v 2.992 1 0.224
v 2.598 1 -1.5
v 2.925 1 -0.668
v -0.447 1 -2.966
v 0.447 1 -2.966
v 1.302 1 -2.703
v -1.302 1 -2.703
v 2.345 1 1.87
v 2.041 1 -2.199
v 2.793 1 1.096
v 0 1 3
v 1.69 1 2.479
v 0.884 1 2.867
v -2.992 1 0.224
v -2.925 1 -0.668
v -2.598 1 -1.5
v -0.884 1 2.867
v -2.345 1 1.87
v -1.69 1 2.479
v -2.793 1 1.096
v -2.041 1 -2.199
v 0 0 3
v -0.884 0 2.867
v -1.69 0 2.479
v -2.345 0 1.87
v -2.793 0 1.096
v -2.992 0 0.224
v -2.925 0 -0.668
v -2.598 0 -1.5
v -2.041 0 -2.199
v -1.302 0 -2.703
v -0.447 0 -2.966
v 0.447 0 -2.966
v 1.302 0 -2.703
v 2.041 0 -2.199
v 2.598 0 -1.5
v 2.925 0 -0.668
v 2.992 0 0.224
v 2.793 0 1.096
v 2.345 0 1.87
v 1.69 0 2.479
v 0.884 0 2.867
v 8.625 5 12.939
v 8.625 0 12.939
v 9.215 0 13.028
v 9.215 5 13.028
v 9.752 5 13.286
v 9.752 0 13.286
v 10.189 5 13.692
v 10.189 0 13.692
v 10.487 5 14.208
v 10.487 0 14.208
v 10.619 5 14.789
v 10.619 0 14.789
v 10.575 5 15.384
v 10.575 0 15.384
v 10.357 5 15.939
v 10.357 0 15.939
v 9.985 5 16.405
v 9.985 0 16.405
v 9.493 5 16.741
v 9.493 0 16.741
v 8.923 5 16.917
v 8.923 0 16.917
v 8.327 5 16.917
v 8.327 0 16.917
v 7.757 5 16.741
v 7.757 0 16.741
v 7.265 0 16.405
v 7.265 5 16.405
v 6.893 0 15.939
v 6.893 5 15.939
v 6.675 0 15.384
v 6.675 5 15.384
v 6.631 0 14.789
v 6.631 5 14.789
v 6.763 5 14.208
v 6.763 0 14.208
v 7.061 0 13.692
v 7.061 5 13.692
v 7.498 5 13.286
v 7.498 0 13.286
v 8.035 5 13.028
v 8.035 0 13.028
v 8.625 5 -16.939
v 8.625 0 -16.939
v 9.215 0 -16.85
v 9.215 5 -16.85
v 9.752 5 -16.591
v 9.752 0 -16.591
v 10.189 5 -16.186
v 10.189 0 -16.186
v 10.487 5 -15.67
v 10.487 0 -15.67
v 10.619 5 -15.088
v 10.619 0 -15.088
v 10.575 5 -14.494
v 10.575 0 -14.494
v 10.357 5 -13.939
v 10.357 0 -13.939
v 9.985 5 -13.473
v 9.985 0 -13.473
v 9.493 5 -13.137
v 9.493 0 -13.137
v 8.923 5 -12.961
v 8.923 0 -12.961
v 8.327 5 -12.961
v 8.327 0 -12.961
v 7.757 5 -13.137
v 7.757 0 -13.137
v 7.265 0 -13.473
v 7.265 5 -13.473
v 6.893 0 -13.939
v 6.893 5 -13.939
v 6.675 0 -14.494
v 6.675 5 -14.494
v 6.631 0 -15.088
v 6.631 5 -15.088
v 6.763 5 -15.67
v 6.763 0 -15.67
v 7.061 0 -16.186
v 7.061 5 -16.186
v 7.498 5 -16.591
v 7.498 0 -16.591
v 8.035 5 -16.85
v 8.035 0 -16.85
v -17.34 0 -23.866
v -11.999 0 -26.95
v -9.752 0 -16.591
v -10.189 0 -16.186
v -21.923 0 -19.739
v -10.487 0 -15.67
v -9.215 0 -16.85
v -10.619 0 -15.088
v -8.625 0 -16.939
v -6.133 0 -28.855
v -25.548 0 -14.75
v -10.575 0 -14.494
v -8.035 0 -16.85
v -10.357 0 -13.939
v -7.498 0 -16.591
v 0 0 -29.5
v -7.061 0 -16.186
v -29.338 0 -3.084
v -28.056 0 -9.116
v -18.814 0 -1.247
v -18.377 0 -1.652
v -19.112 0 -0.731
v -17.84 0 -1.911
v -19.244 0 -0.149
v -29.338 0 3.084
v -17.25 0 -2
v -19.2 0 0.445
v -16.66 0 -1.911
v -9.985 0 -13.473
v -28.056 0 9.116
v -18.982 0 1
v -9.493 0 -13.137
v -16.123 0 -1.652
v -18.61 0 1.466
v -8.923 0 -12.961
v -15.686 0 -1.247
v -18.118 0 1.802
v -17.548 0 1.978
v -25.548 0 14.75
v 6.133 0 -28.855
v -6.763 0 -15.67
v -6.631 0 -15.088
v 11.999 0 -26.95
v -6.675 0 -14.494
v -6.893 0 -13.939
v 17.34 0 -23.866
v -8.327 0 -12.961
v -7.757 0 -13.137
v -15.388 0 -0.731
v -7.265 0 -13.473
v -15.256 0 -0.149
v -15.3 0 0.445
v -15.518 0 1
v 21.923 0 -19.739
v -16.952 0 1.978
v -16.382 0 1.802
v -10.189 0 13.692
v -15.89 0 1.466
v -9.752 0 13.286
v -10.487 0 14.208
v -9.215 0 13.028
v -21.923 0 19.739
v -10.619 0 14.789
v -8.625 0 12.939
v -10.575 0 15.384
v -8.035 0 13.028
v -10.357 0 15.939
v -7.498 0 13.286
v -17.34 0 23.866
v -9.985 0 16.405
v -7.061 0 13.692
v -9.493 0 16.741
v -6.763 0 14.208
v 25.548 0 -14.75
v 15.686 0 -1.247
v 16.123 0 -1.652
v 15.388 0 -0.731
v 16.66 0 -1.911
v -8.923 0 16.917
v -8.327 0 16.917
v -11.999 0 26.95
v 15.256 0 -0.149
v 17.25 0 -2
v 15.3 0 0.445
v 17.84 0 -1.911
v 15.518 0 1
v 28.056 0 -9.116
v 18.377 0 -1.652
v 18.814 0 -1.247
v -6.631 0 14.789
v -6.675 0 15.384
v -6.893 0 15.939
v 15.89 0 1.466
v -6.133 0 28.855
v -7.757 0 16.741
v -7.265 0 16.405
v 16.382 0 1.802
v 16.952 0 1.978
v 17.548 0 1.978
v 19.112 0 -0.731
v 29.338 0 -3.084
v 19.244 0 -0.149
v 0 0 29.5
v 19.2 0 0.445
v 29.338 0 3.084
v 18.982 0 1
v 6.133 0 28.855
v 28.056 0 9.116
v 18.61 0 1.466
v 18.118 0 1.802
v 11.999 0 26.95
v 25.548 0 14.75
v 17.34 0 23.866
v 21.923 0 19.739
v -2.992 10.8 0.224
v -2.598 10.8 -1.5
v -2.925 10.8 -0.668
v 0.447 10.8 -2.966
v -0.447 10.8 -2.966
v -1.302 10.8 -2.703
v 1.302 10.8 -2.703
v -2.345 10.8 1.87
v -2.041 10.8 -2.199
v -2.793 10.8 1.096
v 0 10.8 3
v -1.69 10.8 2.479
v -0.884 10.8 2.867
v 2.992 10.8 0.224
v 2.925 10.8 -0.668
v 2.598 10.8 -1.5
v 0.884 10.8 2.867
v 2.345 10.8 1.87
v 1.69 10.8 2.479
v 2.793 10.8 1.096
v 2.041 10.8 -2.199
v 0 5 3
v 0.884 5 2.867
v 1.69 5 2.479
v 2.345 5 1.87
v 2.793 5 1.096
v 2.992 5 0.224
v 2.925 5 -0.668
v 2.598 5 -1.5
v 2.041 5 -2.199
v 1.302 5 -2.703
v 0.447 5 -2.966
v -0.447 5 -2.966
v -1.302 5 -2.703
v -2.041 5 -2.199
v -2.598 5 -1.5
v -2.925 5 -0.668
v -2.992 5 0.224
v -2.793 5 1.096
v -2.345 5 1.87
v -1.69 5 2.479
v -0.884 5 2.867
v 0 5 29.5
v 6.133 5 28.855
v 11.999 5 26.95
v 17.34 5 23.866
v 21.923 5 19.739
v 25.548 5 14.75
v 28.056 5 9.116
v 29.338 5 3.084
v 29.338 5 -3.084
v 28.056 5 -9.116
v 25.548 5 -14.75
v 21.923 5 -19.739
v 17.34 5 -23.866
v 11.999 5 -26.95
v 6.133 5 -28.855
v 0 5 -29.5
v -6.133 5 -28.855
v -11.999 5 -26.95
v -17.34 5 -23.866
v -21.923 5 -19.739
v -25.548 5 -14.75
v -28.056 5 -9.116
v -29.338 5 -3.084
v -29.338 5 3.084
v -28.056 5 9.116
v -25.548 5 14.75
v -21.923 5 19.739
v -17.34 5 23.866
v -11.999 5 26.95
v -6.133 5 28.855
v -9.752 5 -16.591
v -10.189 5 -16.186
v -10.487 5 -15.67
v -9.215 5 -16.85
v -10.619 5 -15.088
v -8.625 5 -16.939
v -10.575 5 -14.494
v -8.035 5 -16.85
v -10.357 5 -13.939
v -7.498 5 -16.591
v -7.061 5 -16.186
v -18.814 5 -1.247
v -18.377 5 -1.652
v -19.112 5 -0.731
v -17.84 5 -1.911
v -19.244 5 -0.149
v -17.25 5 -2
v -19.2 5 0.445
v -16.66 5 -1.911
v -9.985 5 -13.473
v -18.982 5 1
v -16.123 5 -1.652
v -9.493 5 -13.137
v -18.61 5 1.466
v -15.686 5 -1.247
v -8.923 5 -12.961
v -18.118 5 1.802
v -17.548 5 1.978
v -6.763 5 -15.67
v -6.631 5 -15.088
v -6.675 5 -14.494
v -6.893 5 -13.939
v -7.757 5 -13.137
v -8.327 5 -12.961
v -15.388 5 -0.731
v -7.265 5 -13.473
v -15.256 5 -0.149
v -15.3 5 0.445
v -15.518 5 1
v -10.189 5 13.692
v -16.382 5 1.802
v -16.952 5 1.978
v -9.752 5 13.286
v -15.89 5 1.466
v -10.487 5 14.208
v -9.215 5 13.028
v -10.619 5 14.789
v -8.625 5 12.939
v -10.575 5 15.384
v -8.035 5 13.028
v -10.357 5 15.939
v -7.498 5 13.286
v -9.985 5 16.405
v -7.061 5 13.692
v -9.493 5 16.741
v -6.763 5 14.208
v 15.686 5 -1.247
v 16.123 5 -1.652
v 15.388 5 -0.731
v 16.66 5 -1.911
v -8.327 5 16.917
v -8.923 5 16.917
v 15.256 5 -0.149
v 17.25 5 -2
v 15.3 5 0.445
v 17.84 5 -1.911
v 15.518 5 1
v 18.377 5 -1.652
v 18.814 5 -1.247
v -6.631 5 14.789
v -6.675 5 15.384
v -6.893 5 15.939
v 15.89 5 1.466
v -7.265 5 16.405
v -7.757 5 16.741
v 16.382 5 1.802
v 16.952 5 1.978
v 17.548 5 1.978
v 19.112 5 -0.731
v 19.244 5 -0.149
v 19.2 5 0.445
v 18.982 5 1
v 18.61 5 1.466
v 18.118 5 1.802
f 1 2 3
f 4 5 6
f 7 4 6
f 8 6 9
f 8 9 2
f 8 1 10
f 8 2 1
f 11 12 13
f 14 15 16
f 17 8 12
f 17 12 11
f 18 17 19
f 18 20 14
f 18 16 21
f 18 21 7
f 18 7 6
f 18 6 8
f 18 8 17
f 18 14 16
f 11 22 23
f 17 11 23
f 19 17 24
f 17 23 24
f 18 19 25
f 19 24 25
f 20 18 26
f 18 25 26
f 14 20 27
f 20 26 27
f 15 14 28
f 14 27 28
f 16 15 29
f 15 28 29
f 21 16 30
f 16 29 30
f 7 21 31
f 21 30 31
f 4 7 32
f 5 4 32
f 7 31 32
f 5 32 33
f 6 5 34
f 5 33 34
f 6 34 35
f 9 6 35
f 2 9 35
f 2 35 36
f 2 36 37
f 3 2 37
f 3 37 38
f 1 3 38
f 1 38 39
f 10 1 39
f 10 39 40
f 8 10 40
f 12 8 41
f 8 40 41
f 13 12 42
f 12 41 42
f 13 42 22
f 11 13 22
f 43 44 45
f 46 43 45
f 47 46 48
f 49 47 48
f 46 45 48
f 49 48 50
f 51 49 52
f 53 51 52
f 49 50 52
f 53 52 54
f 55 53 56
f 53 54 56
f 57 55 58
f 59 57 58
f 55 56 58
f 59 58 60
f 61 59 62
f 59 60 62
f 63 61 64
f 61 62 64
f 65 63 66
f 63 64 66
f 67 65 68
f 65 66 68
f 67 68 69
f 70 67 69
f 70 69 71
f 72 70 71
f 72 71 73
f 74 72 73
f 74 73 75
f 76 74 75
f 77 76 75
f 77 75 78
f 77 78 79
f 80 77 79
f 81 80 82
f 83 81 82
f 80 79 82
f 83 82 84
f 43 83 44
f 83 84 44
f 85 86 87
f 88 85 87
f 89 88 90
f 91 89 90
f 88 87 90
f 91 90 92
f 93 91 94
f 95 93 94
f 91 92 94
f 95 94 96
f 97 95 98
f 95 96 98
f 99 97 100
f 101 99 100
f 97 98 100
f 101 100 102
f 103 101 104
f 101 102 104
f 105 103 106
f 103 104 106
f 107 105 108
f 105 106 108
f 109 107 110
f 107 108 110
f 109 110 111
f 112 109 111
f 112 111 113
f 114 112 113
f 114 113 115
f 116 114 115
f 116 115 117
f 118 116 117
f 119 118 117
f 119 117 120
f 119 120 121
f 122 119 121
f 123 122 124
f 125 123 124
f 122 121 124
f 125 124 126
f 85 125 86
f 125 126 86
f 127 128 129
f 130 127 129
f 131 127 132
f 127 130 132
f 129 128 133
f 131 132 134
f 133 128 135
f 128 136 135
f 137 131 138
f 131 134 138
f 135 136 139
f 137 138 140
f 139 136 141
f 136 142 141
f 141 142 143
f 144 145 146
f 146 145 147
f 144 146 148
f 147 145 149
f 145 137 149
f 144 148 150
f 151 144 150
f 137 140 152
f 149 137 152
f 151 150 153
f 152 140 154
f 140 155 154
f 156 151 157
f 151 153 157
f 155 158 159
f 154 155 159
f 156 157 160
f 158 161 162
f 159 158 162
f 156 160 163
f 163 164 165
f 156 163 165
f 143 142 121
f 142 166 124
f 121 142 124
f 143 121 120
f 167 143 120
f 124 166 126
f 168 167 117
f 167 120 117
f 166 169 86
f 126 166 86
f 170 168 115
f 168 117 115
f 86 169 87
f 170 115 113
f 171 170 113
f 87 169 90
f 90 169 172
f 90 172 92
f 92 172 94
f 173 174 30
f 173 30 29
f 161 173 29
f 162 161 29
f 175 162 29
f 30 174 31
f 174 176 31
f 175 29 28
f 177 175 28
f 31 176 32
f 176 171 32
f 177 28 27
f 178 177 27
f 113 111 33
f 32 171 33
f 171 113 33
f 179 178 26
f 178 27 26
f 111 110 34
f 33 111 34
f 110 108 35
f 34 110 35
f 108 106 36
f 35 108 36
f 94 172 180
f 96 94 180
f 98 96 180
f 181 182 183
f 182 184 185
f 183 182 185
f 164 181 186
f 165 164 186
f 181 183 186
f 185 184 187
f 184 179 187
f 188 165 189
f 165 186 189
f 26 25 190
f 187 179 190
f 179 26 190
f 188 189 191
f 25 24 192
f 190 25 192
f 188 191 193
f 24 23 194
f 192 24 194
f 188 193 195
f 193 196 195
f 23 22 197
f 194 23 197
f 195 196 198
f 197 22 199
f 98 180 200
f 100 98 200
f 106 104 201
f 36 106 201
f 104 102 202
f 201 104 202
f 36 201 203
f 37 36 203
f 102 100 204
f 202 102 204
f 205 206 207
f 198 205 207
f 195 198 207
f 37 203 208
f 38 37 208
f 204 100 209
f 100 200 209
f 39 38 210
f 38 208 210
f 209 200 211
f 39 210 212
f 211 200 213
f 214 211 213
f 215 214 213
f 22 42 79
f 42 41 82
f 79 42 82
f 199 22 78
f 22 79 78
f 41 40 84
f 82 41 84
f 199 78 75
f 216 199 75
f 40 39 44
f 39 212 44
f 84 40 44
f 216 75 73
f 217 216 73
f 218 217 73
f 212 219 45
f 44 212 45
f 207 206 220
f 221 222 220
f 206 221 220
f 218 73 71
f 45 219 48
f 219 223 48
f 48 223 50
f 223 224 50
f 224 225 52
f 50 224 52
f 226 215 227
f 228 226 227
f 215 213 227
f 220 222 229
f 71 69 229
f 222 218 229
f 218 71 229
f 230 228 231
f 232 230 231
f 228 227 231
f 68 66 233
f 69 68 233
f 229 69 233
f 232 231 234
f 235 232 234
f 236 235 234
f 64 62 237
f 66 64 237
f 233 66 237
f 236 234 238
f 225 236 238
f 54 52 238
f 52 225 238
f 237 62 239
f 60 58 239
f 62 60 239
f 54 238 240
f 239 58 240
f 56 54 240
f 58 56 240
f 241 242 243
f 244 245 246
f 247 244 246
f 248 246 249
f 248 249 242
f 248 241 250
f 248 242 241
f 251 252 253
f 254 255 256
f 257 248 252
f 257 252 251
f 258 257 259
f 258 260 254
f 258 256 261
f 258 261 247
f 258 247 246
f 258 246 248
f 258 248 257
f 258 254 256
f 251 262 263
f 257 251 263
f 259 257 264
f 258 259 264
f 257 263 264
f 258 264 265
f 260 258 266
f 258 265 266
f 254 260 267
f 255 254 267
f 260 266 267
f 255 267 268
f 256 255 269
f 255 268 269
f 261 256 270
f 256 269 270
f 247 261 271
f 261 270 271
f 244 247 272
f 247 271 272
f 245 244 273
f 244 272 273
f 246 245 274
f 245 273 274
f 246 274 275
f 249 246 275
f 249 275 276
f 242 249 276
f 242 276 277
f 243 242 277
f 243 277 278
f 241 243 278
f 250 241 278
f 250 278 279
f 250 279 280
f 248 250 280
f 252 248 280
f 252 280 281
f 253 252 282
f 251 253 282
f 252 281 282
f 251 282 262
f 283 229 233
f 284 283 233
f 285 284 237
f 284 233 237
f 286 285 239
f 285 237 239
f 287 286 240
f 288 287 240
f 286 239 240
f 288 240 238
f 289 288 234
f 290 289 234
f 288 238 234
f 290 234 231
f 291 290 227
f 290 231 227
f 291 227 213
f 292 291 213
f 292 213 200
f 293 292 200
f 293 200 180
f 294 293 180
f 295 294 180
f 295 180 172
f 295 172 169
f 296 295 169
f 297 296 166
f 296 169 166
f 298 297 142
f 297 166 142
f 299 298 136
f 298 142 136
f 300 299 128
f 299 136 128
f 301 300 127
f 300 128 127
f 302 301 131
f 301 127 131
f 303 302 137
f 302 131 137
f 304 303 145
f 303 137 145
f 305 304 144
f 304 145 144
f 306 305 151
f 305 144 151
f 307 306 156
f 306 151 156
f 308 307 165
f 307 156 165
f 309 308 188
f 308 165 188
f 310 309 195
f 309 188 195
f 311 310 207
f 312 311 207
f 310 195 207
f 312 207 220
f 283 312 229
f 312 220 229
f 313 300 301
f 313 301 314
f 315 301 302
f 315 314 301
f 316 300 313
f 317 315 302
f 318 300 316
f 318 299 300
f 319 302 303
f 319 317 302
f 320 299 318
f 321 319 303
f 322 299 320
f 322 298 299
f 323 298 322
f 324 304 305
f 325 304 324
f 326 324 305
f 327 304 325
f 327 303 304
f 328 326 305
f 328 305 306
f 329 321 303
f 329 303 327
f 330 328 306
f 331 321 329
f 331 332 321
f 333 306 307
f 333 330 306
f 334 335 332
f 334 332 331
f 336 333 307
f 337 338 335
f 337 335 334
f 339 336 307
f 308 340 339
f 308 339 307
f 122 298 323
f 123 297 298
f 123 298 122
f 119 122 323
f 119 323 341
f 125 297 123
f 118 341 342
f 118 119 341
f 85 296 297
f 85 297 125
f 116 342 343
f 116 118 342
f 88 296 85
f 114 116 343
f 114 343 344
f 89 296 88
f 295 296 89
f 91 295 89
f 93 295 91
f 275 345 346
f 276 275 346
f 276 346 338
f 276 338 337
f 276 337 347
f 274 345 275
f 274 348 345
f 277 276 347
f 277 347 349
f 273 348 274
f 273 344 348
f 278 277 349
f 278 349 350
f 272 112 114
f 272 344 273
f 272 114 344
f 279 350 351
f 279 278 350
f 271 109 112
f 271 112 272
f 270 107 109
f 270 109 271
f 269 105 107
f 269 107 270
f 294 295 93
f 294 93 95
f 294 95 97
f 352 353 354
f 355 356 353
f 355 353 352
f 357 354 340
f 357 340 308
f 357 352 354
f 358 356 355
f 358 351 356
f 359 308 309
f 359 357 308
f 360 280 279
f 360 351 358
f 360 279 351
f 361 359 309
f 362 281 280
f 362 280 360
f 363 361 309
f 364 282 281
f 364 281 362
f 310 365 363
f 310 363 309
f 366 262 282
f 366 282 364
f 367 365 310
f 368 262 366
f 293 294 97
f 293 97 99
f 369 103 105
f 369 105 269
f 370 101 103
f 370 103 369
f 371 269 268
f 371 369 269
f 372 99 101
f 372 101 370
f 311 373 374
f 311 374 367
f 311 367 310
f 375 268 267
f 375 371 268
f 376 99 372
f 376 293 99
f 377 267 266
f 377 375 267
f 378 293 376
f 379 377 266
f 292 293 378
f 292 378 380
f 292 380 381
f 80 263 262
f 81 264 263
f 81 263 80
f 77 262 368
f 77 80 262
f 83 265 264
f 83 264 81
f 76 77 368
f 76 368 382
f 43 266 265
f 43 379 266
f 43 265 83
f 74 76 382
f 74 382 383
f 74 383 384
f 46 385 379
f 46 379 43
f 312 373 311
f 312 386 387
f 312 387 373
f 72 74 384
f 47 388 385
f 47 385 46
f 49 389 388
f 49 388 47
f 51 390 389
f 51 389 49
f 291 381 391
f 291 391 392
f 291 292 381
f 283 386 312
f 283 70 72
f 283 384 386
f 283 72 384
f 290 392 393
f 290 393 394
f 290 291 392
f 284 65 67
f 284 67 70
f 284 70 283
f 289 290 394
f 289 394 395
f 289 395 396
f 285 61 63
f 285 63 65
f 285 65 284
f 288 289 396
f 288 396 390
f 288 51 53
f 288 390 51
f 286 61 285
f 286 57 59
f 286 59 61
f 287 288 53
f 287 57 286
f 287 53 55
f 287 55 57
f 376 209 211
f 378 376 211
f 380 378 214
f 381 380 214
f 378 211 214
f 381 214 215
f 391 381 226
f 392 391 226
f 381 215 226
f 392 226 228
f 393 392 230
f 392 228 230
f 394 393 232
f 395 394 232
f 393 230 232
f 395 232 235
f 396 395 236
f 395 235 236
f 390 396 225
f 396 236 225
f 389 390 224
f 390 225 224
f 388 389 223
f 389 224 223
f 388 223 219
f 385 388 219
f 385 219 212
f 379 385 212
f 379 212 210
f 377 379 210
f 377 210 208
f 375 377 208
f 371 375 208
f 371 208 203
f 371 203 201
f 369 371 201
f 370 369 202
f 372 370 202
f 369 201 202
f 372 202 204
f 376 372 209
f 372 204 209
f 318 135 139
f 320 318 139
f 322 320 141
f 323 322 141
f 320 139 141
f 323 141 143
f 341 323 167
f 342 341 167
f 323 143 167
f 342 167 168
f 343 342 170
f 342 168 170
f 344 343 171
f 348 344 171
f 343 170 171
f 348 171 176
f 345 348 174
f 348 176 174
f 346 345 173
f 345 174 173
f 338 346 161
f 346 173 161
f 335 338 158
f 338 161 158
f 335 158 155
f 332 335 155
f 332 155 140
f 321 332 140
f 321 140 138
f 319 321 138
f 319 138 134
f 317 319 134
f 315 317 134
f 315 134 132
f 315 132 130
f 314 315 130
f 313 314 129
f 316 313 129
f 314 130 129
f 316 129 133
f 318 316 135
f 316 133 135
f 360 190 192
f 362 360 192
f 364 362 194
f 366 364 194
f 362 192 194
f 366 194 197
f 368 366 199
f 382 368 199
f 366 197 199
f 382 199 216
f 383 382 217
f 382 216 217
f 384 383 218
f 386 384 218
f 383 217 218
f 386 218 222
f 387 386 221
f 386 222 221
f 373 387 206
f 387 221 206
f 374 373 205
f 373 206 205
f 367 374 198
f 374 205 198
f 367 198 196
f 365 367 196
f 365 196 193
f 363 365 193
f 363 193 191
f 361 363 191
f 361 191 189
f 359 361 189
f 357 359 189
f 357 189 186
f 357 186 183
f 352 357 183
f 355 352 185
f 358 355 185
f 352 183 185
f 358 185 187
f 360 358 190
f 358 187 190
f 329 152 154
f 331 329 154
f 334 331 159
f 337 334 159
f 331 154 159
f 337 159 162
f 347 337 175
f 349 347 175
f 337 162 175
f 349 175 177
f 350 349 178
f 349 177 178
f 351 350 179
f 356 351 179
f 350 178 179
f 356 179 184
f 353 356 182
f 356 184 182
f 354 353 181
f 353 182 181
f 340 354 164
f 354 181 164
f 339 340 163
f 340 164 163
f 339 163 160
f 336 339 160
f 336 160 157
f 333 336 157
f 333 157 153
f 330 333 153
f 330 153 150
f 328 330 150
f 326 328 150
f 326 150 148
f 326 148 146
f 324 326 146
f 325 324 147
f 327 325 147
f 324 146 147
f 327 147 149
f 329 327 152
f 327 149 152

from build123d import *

# Parameters (mm, degrees)
SKETCH_1_R          = 29.5
EXTRUDE_1_DEPTH     = 5
SKETCH_2_R          = 3
EXTRUDE_2_DEPTH     = 5.8
SKETCH_3_R          = 2
CUT_EXTRUDE_1_DEPTH = 5
SKETCH_4_R          = 3
CUT_EXTRUDE_2_DEPTH = 1


with BuildPart() as part:
    # 草图1 → 凸台-拉伸1 (new body)
    with BuildSketch(Plane(origin=(0, 0, 0), x_dir=(1, 0, 0), z_dir=(0, 1, 0))):
        with Locations(Location((0, 0, 0), (0, 0, 270))):
            Circle(SKETCH_1_R)
    extrude(amount=EXTRUDE_1_DEPTH)

    # 草图2 → 凸台-拉伸2 (add)
    with BuildSketch(Plane(origin=(0, 5, 0), x_dir=(1, 0, 0), z_dir=(0, 1, 0))):
        with Locations(Location((0, 0, 0), (0, 0, 270))):
            Circle(SKETCH_2_R)
    extrude(amount=EXTRUDE_2_DEPTH)

    # 草图3 → 切除-拉伸1 (cut)
    with BuildSketch(Plane.XZ):
        with Locations(Location((17.25, 0, 0), (0, 0, 270))):
            Circle(SKETCH_3_R)
        with Locations(Location((8.625, -14.938938215, 0), (0, 0, 270))):
            Circle(SKETCH_3_R)
        with Locations(Location((-8.625, -14.938938215, 0), (0, 0, 270))):
            Circle(SKETCH_3_R)
        with Locations(Location((-17.25, 0, 0), (0, 0, 270))):
            Circle(SKETCH_3_R)
        with Locations(Location((-8.625, 14.938938215, 0), (0, 0, 270))):
            Circle(SKETCH_3_R)
        with Locations(Location((8.625, 14.938938215, 0), (0, 0, 270))):
            Circle(SKETCH_3_R)
    extrude(amount=-CUT_EXTRUDE_1_DEPTH, mode=Mode.SUBTRACT)

    # 草图4 → 切除-拉伸2 (cut)
    with BuildSketch(Plane.XZ):
        with Locations(Location((0, 0, 0), (0, 0, 90))):
            Circle(SKETCH_4_R)
    extrude(amount=-CUT_EXTRUDE_2_DEPTH, mode=Mode.SUBTRACT)


solid = part.part
